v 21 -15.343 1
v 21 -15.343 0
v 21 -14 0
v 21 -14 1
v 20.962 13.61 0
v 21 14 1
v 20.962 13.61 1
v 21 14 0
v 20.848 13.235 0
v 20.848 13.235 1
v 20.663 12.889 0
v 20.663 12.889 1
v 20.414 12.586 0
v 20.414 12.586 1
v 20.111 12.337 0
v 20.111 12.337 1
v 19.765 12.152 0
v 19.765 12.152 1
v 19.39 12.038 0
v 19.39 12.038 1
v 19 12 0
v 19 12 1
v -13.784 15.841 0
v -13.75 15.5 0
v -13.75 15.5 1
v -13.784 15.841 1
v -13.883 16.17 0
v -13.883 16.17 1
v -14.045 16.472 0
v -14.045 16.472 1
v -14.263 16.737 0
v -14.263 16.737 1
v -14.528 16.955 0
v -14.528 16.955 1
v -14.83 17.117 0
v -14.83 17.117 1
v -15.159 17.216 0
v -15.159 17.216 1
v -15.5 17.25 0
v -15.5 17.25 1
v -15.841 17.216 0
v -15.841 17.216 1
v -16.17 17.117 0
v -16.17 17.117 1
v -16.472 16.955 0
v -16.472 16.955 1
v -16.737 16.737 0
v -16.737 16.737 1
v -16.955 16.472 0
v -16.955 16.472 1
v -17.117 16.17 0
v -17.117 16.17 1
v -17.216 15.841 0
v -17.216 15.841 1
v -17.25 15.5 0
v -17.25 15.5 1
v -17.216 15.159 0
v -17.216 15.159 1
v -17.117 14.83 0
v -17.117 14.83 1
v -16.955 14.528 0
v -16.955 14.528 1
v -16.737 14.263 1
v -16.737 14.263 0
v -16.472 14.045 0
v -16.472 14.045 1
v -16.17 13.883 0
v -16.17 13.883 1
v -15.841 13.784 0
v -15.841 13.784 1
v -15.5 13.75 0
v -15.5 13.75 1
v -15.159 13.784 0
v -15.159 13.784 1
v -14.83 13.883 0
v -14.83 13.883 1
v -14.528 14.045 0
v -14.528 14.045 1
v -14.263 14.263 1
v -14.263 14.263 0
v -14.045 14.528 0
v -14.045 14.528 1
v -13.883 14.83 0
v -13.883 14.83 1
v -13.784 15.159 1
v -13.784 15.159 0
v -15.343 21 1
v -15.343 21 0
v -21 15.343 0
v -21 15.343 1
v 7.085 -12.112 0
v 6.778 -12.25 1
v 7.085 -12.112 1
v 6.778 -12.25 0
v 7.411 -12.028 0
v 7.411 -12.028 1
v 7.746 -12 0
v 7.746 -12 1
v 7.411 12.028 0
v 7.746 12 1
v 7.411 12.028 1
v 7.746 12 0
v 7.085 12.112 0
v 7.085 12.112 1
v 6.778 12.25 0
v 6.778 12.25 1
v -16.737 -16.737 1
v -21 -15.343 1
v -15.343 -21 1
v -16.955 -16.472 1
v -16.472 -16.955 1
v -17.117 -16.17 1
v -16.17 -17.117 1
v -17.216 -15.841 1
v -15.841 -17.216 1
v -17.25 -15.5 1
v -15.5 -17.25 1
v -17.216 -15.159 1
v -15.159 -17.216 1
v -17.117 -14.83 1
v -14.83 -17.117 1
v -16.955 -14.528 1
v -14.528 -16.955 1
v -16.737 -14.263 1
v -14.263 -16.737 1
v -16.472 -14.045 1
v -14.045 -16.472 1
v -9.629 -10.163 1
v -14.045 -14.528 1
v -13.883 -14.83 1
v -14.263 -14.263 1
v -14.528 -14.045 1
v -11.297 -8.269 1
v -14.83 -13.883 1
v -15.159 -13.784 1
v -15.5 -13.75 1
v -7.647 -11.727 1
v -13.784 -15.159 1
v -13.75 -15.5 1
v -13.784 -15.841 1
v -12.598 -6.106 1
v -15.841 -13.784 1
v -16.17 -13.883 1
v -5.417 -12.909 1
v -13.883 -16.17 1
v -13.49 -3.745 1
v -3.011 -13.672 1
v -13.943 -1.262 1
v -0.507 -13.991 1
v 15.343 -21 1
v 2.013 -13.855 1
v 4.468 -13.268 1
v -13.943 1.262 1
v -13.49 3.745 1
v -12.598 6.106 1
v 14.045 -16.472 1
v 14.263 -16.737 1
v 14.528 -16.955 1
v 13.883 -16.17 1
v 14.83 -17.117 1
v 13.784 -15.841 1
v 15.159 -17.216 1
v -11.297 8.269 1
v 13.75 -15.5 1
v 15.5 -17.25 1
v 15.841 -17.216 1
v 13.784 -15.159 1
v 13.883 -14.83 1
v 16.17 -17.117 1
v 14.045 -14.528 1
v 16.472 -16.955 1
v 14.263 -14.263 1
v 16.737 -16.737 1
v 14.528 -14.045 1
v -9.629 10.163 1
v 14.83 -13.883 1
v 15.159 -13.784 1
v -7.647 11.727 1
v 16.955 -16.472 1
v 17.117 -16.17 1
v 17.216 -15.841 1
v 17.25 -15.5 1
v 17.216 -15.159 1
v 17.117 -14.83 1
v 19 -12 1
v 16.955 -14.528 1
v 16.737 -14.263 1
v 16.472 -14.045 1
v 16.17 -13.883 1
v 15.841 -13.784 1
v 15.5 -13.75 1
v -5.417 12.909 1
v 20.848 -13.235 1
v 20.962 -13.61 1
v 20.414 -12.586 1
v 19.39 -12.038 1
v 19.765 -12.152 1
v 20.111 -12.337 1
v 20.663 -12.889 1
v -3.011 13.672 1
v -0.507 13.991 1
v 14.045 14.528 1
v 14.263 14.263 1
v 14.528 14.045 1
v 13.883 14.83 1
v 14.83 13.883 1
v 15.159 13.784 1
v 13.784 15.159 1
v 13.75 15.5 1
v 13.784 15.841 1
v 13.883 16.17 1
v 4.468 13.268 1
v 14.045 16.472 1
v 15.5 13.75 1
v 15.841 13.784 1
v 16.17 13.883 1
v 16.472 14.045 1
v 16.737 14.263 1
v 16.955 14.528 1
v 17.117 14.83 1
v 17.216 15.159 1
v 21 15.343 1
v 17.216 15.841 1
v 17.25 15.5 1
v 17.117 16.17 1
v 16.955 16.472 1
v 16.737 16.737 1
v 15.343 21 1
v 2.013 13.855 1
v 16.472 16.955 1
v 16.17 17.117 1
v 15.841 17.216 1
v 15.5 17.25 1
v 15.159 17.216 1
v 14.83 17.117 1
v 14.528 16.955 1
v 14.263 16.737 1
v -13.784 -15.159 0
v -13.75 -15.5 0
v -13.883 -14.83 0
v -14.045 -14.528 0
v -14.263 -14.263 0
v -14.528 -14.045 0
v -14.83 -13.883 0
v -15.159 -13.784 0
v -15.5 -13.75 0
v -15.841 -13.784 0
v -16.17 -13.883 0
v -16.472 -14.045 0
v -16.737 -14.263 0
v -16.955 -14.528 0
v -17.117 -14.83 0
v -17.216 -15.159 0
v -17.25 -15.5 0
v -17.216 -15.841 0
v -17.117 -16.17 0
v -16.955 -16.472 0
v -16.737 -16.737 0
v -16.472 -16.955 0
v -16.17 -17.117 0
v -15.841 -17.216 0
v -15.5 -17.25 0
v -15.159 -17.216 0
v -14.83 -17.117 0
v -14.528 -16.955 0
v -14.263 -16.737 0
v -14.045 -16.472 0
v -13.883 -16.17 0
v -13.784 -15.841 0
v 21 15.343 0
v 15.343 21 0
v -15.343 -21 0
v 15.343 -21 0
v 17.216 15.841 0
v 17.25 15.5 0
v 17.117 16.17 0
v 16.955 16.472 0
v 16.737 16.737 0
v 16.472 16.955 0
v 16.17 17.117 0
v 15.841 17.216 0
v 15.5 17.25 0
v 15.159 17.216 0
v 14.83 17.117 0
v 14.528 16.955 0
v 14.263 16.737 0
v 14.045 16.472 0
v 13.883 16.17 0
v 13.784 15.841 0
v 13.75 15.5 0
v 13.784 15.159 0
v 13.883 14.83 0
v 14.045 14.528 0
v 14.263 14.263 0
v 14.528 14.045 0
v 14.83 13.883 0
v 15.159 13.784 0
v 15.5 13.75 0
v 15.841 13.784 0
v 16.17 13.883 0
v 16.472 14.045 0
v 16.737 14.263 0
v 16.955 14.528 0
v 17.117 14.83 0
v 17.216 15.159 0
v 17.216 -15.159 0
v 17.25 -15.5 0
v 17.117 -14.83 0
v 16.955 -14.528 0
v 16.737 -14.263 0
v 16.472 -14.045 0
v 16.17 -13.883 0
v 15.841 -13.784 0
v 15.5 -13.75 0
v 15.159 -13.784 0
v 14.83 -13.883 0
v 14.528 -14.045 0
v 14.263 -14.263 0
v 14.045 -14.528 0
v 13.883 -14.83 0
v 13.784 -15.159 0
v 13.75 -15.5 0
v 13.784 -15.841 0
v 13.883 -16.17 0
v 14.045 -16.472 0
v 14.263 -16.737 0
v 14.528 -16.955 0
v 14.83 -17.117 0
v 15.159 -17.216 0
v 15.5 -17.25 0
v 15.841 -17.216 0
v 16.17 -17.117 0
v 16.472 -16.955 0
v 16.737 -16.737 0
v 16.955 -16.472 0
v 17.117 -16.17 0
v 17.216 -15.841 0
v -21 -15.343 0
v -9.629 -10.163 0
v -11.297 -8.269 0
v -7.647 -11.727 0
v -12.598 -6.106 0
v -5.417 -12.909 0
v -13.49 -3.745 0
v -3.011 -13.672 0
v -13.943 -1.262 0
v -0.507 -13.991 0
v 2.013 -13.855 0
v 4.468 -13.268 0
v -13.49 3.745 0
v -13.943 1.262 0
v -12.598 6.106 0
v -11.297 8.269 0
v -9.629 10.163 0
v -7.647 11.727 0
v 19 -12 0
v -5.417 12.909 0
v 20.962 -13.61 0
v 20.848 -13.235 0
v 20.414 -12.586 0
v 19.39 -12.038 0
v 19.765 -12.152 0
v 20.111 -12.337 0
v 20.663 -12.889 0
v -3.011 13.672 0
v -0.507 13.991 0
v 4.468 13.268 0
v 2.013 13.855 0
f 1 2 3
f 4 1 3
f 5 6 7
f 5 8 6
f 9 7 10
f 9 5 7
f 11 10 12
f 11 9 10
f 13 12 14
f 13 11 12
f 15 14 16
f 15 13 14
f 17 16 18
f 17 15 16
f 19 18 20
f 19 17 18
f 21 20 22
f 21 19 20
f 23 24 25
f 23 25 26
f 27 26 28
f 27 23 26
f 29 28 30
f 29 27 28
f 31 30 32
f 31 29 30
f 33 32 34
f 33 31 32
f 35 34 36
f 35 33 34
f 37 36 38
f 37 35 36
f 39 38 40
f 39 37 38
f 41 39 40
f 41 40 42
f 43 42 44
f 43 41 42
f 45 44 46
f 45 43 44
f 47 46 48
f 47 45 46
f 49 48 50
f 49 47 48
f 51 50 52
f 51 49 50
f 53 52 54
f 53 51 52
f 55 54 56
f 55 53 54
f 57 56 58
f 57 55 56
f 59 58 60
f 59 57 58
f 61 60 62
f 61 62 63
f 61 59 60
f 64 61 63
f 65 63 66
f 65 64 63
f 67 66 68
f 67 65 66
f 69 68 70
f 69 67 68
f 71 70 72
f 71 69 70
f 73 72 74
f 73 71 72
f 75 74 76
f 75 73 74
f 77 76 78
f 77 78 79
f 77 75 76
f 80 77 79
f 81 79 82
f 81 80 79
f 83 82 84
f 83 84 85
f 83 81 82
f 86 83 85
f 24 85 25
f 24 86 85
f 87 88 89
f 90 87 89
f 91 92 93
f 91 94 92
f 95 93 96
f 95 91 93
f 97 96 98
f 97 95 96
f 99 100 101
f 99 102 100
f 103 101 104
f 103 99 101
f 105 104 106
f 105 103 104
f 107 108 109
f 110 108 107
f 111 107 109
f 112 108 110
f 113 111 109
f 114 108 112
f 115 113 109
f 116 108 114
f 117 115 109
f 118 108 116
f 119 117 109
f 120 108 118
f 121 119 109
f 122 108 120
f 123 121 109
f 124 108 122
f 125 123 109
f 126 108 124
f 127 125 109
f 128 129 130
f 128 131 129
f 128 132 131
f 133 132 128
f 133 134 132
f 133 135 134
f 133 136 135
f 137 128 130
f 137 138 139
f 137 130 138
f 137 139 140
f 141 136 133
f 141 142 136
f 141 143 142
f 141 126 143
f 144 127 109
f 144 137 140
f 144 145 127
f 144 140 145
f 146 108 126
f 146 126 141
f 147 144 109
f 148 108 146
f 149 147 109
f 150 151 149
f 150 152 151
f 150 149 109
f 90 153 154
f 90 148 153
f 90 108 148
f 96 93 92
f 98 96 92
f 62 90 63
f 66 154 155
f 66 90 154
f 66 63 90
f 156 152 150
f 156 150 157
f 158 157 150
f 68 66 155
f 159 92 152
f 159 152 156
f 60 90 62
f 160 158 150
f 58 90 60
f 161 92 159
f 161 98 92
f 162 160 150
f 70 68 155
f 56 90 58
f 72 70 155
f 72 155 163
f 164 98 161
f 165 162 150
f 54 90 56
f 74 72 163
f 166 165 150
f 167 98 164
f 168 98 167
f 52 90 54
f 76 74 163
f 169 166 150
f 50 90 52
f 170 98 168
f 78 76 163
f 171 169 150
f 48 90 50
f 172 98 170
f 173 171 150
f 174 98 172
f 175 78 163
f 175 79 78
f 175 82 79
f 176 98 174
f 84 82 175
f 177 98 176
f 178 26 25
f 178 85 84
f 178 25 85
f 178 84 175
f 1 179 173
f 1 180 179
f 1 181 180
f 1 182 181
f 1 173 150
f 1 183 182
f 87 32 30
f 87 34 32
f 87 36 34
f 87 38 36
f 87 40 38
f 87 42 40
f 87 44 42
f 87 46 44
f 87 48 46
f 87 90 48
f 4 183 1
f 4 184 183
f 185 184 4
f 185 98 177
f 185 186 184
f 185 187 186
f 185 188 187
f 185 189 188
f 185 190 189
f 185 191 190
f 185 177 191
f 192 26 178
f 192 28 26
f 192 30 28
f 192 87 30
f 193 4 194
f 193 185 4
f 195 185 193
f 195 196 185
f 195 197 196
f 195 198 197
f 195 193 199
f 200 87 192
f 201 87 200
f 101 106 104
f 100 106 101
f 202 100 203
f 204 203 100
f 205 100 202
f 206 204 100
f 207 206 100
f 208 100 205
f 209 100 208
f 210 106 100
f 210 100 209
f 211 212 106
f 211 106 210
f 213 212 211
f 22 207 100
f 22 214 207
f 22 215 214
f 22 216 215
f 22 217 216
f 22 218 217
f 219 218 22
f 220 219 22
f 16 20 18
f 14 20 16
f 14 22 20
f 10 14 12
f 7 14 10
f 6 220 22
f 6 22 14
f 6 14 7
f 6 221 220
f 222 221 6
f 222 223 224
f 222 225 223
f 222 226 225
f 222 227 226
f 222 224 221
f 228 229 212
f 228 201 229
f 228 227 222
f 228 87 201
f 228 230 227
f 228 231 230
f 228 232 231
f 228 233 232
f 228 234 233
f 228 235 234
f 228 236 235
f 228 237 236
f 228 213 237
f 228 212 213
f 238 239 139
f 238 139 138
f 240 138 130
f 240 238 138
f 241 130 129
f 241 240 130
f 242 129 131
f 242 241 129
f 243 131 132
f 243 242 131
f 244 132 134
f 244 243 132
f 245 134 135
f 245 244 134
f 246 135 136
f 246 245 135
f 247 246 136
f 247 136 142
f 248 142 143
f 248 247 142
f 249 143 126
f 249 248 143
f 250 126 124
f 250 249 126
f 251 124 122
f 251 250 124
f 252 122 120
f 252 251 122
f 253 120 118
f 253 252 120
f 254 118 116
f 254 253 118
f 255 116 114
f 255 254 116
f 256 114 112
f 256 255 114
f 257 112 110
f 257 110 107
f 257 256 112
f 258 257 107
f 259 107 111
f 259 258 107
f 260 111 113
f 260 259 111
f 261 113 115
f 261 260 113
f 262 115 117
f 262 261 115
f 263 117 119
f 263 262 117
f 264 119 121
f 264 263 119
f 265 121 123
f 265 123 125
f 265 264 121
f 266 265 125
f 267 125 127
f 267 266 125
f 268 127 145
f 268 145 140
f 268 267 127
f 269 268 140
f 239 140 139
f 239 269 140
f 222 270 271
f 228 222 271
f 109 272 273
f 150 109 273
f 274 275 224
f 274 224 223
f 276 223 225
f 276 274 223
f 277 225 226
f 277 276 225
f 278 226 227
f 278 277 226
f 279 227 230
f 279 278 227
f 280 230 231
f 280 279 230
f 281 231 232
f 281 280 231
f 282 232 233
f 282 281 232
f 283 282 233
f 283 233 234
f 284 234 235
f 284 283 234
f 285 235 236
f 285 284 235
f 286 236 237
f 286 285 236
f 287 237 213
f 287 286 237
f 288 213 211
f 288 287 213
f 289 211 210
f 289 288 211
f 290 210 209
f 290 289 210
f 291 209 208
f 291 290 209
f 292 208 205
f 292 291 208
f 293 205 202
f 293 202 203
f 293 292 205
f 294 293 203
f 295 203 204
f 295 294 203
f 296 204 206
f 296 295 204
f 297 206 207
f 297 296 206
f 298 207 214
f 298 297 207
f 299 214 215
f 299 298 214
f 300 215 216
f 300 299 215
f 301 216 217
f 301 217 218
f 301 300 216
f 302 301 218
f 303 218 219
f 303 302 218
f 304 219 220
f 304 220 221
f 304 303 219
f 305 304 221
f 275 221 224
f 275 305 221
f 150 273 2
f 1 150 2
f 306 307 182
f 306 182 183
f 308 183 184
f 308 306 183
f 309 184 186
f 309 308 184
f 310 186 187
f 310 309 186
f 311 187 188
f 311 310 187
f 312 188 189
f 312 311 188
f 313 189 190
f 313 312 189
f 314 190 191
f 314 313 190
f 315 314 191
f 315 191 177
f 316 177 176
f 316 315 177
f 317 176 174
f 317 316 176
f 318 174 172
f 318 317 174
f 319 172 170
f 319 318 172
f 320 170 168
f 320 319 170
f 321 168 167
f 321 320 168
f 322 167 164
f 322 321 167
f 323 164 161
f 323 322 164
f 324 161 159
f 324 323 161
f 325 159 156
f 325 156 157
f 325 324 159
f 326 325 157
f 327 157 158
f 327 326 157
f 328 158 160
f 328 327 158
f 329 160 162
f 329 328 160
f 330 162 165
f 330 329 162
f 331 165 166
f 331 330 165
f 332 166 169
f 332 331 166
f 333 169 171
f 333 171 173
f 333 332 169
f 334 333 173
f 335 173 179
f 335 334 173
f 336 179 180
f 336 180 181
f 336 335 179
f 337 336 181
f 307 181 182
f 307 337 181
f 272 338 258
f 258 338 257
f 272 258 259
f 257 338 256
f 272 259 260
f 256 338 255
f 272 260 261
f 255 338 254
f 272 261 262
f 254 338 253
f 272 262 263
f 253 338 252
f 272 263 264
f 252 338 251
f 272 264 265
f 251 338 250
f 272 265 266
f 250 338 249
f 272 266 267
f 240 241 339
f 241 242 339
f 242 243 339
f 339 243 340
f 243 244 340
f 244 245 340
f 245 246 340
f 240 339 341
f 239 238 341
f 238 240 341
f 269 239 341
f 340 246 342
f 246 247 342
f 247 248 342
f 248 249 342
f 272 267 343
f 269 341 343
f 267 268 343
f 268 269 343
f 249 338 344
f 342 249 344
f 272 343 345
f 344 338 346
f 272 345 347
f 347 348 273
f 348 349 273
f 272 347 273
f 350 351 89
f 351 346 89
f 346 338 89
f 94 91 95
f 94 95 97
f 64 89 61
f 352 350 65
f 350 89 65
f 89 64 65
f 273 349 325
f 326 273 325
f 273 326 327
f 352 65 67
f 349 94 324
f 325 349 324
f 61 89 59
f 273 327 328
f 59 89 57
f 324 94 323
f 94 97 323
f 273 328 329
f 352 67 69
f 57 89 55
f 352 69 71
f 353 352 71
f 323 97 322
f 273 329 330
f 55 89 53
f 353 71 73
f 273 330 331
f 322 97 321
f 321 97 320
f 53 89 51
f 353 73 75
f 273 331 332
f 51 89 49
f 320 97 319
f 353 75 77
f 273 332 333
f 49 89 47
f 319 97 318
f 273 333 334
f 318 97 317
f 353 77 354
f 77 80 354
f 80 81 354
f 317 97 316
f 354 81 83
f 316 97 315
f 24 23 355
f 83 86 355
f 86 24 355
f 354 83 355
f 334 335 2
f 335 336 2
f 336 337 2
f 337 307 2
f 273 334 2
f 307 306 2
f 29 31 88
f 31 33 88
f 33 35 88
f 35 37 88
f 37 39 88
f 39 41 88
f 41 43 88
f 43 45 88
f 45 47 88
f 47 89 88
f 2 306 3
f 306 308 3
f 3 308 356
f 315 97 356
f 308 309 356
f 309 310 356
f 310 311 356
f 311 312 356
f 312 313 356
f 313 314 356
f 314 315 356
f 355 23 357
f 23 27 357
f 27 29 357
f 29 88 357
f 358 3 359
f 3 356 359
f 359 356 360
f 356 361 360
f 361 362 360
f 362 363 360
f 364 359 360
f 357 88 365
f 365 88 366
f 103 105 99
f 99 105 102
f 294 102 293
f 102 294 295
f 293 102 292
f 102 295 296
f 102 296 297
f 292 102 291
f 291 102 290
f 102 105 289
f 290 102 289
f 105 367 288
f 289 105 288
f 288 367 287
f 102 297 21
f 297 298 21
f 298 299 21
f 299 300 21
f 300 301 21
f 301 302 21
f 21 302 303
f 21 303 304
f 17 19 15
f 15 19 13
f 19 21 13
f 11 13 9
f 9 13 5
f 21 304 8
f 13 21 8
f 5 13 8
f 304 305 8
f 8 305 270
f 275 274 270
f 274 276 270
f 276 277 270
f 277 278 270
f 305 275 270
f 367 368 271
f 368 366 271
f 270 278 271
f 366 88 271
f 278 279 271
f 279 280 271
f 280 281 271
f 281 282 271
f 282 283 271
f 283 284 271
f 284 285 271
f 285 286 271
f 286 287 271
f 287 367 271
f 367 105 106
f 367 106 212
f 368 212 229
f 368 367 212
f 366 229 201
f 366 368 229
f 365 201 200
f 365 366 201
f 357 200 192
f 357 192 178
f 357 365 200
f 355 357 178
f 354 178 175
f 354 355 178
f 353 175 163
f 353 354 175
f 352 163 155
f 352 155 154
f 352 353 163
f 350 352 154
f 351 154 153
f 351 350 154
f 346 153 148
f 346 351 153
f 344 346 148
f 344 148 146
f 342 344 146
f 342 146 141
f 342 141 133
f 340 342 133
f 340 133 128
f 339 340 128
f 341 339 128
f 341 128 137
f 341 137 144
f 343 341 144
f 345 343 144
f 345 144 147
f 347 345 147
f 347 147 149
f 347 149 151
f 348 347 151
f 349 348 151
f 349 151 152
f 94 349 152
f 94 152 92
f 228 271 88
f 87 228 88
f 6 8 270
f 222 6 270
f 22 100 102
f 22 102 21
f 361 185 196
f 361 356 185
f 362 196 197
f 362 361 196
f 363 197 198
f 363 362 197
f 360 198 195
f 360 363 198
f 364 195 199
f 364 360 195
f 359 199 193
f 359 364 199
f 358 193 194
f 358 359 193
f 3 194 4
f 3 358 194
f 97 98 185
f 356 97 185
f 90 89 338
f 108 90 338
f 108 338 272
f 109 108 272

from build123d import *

# Parameters (mm, degrees)
F0_R     = 1.75
F0_R_2   = 14
F1_DEPTH = 1
F2_W     = 21
F2_H     = 24
F3_DEPTH = 1.001
F4_R     = 2


with BuildPart() as f1:
    # F0 (on Top) → F1 (new body)
    with BuildSketch(Plane.XY):
        Polygon((15.3431457505, 21), (-15.3431457505, 21), (-21, 15.3431457505), (-21, -15.3431457505), (-15.3431457505, -21), (15.3431457505, -21), (21, -15.3431457505), (21, 15.3431457505), align=None)
        with Locations((-15.5, -15.5)):
            Circle(F0_R, mode=Mode.SUBTRACT)
        with Locations((15.5, -15.5)):
            Circle(F0_R, mode=Mode.SUBTRACT)
        with Locations((-15.5, 15.5)):
            Circle(F0_R, mode=Mode.SUBTRACT)
        Circle(F0_R_2, mode=Mode.SUBTRACT)
        with Locations((15.5, 15.5)):
            Circle(F0_R, mode=Mode.SUBTRACT)
    extrude(amount=F1_DEPTH)

    # F2 (on face) → F3 (cut, through all)
    with BuildSketch(Plane.XY.offset(1)):
        with Locations((10.5, 0)):
            Rectangle(F2_W, F2_H)
    extrude(amount=-F3_DEPTH, mode=Mode.SUBTRACT)

    # F4
    f4_edges = [f1.edges().sort_by_distance(p)[0] for p in [
        (7.211103, 12, 0.5),
        (21, 12, 0.5),
        (21, -12, 0.5),
        (7.211103, -12, 0.5),
    ]]
    fillet(f4_edges, radius=F4_R)


solid = f1.part
